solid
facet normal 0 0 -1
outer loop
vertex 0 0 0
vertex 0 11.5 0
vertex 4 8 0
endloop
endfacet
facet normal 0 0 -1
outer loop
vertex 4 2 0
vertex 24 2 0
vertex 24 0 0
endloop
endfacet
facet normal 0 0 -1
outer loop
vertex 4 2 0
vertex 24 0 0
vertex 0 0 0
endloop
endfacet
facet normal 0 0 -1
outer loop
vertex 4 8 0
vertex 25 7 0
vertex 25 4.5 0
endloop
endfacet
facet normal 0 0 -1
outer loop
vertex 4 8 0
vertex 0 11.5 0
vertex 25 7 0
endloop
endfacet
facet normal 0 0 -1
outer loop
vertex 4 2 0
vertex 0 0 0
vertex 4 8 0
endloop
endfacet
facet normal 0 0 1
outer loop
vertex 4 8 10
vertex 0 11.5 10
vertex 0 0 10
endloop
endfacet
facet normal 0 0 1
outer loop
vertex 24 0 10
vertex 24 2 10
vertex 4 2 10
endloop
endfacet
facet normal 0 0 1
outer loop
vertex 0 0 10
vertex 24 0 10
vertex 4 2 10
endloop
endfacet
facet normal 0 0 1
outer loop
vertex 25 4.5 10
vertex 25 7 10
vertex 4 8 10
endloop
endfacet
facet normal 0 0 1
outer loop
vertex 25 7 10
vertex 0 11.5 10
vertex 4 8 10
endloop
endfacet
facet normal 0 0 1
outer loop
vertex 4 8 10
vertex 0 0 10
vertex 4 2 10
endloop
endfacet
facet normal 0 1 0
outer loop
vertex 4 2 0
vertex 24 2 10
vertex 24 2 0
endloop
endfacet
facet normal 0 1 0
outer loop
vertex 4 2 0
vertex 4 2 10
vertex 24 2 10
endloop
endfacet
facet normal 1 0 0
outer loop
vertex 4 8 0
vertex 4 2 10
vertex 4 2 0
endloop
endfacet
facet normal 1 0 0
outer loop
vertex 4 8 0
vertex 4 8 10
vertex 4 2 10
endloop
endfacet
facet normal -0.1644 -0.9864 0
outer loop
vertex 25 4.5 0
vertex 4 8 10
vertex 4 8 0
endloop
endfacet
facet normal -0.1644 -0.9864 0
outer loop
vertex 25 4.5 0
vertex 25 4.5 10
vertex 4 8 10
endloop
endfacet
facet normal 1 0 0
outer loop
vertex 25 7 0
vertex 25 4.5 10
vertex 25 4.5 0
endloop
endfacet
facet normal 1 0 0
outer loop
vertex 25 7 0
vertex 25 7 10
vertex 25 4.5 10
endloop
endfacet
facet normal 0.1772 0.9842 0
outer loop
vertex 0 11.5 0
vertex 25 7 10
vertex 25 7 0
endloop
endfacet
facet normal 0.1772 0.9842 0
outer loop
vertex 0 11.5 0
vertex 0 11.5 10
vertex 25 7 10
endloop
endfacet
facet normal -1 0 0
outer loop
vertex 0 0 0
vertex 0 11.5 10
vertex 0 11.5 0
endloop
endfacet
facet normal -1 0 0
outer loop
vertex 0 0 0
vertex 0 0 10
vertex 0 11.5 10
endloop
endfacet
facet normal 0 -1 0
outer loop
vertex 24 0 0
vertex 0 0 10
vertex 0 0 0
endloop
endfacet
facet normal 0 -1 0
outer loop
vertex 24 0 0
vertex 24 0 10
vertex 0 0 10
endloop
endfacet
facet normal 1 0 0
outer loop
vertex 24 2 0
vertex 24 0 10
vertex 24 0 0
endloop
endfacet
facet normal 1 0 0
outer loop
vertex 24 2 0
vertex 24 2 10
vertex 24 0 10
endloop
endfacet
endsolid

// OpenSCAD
height = 5;
slope = 3.5;
clipWidth = 10;

trueHeight = height + 1;
draftHeight = trueHeight - slope;



linear_extrude(height = clipWidth) {
    polygon(points = [  [0,0],
                        [24,0],
                        [24,2], 
                        [4,2],
                        [4,2 + trueHeight], //2+6=8
                        [25,2 + draftHeight], 
                        [25,2 + draftHeight + 2.5], 
                        [0,2 + trueHeight + slope ] 
                       ]);

}
                    
